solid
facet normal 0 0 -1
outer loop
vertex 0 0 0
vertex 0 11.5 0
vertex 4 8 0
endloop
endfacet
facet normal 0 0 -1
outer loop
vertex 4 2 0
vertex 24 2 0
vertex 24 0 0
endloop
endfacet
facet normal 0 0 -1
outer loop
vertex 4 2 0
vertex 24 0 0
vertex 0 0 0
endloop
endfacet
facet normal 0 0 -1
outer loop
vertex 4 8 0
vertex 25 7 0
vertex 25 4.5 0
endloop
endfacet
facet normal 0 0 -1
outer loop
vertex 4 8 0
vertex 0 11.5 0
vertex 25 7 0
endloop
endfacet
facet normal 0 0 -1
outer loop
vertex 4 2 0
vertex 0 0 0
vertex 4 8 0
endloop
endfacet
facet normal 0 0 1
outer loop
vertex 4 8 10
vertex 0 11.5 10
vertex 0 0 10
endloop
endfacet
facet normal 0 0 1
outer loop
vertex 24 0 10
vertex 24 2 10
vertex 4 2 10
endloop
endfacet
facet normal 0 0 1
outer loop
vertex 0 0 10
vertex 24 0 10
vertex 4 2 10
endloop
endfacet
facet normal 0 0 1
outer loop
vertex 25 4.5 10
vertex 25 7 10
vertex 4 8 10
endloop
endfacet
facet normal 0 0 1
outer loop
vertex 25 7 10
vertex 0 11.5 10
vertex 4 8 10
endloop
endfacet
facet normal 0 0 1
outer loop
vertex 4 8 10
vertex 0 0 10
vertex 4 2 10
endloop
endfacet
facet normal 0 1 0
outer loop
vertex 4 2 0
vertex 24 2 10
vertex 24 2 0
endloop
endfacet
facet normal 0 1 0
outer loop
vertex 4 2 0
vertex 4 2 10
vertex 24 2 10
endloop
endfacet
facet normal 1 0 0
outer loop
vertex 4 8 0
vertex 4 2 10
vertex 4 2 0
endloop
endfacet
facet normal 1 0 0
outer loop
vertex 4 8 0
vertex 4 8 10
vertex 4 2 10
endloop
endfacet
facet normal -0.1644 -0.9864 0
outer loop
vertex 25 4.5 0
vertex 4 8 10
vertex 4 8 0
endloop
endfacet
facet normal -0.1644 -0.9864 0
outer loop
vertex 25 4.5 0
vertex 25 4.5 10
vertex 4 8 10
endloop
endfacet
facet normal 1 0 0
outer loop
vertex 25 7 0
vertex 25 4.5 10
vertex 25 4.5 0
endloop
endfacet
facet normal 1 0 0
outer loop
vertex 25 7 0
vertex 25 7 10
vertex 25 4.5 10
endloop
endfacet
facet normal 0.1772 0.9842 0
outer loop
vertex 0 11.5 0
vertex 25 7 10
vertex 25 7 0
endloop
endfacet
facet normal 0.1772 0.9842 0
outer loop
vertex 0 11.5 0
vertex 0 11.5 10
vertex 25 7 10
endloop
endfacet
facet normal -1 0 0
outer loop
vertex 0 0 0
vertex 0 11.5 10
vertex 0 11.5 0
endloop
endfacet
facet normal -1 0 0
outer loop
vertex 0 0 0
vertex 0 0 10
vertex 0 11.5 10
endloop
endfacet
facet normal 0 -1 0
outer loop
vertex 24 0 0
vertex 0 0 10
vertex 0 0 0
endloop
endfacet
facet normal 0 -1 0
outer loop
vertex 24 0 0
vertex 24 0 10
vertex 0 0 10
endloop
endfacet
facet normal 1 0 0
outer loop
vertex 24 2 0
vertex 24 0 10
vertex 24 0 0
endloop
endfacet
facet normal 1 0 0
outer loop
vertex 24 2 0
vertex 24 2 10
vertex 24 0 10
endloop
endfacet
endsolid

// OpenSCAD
height = 5;
slope = 3.5;
clipWidth = 10;

trueHeight = height + 1;
draftHeight = trueHeight - slope;



linear_extrude(height = clipWidth) {
    polygon(points = [  [0,0],
                        [24,0],
                        [24,2], 
                        [4,2],
                        [4,2 + trueHeight], //2+6=8
                        [25,2 + draftHeight], 
                        [25,2 + draftHeight + 2.5], 
                        [0,2 + trueHeight + slope ] 
                       ]);

}
                    
